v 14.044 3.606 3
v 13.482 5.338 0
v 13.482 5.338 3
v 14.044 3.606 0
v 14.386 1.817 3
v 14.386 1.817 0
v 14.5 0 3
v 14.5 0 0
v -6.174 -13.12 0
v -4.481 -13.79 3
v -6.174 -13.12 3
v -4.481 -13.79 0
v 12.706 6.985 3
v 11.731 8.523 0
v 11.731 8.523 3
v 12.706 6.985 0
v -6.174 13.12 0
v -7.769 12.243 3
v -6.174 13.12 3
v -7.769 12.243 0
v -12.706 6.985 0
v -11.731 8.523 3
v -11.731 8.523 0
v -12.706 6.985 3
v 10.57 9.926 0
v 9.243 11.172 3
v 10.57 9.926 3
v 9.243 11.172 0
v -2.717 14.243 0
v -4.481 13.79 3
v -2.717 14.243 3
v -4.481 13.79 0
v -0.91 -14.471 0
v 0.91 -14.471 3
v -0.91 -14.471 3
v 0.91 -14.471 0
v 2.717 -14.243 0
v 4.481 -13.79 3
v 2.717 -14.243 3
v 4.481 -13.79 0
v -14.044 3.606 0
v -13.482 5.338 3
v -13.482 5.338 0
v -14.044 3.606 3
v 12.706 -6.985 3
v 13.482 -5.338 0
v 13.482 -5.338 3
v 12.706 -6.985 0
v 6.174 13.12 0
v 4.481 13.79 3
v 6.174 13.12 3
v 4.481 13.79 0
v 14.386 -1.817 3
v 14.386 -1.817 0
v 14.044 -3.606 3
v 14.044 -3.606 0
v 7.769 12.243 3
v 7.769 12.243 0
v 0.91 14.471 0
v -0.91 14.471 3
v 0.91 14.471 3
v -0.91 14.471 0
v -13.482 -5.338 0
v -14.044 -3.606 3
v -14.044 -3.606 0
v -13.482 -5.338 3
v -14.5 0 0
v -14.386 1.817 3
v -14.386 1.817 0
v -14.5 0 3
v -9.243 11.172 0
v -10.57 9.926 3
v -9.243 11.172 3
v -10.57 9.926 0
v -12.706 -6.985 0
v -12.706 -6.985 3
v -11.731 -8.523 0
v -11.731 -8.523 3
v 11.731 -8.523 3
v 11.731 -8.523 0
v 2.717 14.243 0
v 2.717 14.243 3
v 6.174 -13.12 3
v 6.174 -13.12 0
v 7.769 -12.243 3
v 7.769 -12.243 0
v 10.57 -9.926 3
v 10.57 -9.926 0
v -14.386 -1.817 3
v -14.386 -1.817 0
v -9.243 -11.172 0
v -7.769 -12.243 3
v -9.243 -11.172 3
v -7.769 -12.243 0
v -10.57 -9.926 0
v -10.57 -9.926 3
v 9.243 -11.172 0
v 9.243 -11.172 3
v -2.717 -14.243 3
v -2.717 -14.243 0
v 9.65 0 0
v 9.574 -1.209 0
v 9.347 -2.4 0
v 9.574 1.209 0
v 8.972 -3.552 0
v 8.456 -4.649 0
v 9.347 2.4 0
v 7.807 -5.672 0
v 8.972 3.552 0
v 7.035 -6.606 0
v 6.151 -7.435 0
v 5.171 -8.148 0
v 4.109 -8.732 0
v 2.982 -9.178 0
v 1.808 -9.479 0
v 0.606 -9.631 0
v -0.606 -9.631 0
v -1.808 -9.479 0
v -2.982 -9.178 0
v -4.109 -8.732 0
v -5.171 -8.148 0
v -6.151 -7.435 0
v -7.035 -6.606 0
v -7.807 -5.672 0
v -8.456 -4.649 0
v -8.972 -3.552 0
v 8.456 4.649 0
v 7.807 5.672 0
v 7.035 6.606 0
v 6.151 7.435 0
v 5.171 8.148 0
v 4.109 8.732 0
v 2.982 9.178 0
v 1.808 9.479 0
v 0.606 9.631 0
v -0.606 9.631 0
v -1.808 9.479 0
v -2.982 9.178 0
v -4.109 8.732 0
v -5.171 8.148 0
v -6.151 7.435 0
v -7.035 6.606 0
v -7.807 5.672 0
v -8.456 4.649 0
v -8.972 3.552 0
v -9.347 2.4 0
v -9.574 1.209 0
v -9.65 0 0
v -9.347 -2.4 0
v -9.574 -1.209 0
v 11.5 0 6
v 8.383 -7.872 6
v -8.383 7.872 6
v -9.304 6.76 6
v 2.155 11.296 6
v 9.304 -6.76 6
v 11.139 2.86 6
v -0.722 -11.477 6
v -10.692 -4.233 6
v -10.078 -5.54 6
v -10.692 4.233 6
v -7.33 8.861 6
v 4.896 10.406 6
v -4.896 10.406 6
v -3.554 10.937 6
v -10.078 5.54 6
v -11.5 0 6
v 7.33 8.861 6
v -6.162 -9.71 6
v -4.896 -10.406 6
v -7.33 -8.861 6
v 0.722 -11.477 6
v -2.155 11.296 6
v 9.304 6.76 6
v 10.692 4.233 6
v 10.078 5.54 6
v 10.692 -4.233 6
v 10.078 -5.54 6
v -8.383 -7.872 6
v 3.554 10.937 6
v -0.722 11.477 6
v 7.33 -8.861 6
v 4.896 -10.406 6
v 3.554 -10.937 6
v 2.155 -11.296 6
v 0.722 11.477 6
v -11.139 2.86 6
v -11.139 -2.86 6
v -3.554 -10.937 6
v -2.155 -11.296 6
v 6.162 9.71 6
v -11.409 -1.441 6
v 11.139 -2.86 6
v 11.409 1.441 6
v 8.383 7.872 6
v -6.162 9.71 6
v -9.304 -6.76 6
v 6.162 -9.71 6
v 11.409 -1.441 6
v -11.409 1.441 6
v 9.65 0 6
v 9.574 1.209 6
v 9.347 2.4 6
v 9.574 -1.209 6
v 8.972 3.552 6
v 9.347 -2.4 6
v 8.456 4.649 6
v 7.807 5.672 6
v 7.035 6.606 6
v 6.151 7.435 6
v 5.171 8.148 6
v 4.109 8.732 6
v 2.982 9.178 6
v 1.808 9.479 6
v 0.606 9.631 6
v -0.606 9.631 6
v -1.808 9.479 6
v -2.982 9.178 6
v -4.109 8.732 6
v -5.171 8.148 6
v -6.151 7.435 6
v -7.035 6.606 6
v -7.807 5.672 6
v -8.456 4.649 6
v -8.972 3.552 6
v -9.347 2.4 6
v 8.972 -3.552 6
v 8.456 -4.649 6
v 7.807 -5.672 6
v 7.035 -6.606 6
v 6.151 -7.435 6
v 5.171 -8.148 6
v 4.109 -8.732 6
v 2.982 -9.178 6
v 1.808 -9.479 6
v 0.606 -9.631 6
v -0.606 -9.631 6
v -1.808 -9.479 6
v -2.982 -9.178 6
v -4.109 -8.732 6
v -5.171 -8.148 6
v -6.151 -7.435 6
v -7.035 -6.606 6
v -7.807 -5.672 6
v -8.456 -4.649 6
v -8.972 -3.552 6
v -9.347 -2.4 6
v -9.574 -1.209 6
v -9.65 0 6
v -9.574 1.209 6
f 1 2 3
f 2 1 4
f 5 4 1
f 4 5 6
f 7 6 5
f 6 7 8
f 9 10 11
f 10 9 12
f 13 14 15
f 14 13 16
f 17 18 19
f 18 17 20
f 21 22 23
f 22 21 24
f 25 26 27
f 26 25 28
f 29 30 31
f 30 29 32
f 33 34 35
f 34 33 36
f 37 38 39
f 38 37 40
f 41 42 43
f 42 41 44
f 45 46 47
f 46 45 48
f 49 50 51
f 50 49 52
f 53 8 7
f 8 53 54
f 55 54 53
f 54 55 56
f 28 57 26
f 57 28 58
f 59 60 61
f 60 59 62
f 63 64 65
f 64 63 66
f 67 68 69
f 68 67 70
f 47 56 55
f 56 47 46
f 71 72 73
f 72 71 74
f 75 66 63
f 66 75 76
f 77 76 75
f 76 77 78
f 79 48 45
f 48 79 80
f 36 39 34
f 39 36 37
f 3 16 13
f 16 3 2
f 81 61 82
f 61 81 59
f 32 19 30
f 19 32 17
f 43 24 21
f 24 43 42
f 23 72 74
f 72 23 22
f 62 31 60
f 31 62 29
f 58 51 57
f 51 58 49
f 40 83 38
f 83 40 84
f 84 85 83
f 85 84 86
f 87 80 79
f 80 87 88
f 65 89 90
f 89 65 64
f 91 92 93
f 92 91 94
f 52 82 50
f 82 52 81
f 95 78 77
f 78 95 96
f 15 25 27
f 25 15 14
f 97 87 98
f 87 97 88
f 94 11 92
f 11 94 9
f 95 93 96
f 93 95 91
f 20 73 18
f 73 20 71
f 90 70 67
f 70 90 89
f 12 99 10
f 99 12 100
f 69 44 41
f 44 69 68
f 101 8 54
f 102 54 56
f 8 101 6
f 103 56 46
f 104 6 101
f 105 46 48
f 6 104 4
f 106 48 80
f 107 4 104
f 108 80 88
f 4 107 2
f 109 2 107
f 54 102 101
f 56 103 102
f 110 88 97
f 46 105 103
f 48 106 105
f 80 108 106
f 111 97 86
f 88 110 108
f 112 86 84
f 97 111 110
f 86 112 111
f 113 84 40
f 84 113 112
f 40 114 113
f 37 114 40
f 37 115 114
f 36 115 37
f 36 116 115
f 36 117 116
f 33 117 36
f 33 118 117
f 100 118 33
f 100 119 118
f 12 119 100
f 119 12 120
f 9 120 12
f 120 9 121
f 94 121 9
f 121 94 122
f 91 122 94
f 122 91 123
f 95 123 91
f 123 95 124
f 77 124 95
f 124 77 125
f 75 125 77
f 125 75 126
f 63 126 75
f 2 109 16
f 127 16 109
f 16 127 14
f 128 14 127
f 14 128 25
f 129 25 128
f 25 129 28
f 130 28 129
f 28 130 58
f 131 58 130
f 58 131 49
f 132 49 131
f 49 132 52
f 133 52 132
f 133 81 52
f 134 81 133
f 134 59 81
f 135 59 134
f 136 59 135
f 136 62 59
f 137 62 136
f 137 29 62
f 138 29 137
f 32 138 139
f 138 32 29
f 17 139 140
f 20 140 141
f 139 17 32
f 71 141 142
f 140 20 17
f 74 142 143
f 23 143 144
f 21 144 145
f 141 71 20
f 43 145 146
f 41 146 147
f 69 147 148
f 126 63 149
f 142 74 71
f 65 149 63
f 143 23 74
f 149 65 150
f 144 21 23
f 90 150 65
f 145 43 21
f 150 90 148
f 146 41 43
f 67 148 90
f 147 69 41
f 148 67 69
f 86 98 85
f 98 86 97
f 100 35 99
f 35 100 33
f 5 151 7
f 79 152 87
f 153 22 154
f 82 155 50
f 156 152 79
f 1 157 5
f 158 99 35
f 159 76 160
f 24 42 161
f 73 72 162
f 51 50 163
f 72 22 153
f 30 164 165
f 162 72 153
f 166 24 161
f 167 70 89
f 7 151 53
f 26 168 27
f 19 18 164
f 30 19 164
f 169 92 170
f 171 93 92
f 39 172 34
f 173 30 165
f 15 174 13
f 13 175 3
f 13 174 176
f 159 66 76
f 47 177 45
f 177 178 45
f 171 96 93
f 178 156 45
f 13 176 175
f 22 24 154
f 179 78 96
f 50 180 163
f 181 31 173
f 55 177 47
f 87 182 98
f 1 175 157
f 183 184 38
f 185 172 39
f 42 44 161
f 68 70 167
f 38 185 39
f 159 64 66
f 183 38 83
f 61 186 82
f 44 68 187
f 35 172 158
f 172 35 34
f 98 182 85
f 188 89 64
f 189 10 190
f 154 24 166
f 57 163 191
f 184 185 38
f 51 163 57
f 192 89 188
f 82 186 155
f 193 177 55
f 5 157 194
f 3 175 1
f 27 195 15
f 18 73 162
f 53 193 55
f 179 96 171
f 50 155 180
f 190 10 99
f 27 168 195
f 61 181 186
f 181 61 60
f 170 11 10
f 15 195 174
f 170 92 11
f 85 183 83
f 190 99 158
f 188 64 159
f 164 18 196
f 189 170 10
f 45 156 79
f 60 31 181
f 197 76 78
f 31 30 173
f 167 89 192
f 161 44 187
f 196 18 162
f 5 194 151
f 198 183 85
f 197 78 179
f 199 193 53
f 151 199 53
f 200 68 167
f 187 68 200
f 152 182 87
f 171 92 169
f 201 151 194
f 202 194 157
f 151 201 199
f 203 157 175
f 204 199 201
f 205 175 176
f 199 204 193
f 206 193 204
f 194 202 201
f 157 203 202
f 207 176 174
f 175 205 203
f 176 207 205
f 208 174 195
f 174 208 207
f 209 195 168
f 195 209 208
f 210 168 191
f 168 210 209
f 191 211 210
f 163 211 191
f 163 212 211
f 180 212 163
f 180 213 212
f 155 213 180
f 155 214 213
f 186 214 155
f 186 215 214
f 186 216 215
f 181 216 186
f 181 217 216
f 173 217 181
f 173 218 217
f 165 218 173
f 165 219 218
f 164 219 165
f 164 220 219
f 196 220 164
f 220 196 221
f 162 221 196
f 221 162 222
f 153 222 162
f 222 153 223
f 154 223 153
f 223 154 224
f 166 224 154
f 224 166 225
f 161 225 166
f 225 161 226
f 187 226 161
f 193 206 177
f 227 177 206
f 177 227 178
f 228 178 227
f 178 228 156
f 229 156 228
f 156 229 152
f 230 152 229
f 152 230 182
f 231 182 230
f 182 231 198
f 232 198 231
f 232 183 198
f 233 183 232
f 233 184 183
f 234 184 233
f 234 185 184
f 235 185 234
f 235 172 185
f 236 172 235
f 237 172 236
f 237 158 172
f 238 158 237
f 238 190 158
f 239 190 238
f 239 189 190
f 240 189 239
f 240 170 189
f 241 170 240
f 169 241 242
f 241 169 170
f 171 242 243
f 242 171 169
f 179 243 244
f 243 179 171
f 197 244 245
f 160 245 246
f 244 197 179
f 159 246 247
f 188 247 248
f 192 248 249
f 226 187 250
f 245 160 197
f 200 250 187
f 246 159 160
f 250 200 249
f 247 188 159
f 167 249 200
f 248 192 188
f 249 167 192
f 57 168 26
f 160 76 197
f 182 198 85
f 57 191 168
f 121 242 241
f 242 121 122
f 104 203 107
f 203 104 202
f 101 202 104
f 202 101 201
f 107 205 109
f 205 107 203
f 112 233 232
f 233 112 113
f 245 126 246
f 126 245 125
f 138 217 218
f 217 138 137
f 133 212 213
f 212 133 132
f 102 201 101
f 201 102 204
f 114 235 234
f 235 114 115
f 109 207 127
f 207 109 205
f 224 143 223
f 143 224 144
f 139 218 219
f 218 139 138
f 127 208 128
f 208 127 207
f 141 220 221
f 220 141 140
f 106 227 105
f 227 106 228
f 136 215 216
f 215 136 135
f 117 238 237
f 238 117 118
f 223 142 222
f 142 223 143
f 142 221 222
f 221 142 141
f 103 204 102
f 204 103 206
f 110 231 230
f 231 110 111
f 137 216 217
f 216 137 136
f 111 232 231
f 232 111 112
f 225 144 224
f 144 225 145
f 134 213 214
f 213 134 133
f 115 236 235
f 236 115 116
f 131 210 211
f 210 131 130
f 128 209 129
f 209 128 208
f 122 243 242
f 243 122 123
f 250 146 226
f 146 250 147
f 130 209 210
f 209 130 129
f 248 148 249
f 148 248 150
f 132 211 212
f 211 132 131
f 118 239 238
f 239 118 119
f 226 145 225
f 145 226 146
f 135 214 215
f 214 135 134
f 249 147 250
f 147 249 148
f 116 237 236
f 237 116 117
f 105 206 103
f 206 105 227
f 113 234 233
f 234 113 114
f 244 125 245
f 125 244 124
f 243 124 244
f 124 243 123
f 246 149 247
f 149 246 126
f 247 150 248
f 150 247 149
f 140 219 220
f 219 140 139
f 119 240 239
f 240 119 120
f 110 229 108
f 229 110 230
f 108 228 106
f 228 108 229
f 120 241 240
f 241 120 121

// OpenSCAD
$fn=50;

module bottom() {
    difference() {
        union() {
            translate([0,-12.5,0]) cube([17.5,25,4]);
            translate([0,0,0]) cylinder(4, d=29);
            translate([0,0,0]) cylinder(5, d=23);
            translate([-14.4,2.5,2.5]) rotate([90,90,0]) cylinder(5,d=4.8, $fn=3);
        }
        translate([0,0,-0.1]) cylinder(10, d=19);
        
        translate([15.5,-8.5,1]) rotate([90,90,0]) cylinder(5,d=3 );    
        translate([14, -12.6,-0.1]) cube([3,4.1,1.25]);
        
        translate([15.5,12.6,1]) rotate([90,90,0]) cylinder(4,d=3 );    
        translate([14, 8.6,-0.1]) cube([3,4.1,1.25]);    
    }
}

module bottom2() {
    difference() {
        union() {
            translate([0,0,0]) cylinder(3, d=29);
            translate([0,0,3]) cylinder(3, r1=14.5, r2=11.5);
        }
        translate([0,0,-0.1]) cylinder(10, d=19.3);
        
    }
}

module top() {
    difference() {
        union() {
            translate([0,-14.5,2]) cube([17.5,29,5]);
            translate([-16.5,-2.5,0]) rotate([0,-31,0]) cube([1,5,7.6]);
            
            translate([-16.2,-2.5,5]) rotate([-90,-30,0]) cylinder(5,d=8, $fn=3);
            
            
            translate([0,0,2]) cylinder(5, d=29.2);
            
            translate([12.5, 12.7,.33]) cube([5,1.8,3]);    
            translate([12.5, -14.5,.33]) cube([5,1.8,3]);    
            translate([15, 14.5,.5]) rotate([90,0,0]) cylinder(d=5,h=1.8);                    
            translate([15, -12.7,.5]) rotate([90,0,0]) cylinder(d=5,h=1.8);                    
            translate([15, 14,-1]) rotate([90,0,0]) cylinder(3, d=2);    
            translate([15, -11,-1]) rotate([90,0,0]) cylinder(3, d=2);    
            
        }
        translate([0,0,1.9]) cylinder(4, d=24);
        //translate([15, 15,0]) rotate([90,0,0]) cylinder(30, d=2);    
    }
}

module twoButton() {
    difference() {
        union() {
            bottom2();
            translate([0,20,0]) bottom2();
        }
        
        translate([0,0,-0.1]) cylinder(10, d=19.3);
        translate([0,20,-0.1]) cylinder(10, d=19.3);
    }
}

bottom2();
//twoButton();

//bottom();

//color("green") top();
